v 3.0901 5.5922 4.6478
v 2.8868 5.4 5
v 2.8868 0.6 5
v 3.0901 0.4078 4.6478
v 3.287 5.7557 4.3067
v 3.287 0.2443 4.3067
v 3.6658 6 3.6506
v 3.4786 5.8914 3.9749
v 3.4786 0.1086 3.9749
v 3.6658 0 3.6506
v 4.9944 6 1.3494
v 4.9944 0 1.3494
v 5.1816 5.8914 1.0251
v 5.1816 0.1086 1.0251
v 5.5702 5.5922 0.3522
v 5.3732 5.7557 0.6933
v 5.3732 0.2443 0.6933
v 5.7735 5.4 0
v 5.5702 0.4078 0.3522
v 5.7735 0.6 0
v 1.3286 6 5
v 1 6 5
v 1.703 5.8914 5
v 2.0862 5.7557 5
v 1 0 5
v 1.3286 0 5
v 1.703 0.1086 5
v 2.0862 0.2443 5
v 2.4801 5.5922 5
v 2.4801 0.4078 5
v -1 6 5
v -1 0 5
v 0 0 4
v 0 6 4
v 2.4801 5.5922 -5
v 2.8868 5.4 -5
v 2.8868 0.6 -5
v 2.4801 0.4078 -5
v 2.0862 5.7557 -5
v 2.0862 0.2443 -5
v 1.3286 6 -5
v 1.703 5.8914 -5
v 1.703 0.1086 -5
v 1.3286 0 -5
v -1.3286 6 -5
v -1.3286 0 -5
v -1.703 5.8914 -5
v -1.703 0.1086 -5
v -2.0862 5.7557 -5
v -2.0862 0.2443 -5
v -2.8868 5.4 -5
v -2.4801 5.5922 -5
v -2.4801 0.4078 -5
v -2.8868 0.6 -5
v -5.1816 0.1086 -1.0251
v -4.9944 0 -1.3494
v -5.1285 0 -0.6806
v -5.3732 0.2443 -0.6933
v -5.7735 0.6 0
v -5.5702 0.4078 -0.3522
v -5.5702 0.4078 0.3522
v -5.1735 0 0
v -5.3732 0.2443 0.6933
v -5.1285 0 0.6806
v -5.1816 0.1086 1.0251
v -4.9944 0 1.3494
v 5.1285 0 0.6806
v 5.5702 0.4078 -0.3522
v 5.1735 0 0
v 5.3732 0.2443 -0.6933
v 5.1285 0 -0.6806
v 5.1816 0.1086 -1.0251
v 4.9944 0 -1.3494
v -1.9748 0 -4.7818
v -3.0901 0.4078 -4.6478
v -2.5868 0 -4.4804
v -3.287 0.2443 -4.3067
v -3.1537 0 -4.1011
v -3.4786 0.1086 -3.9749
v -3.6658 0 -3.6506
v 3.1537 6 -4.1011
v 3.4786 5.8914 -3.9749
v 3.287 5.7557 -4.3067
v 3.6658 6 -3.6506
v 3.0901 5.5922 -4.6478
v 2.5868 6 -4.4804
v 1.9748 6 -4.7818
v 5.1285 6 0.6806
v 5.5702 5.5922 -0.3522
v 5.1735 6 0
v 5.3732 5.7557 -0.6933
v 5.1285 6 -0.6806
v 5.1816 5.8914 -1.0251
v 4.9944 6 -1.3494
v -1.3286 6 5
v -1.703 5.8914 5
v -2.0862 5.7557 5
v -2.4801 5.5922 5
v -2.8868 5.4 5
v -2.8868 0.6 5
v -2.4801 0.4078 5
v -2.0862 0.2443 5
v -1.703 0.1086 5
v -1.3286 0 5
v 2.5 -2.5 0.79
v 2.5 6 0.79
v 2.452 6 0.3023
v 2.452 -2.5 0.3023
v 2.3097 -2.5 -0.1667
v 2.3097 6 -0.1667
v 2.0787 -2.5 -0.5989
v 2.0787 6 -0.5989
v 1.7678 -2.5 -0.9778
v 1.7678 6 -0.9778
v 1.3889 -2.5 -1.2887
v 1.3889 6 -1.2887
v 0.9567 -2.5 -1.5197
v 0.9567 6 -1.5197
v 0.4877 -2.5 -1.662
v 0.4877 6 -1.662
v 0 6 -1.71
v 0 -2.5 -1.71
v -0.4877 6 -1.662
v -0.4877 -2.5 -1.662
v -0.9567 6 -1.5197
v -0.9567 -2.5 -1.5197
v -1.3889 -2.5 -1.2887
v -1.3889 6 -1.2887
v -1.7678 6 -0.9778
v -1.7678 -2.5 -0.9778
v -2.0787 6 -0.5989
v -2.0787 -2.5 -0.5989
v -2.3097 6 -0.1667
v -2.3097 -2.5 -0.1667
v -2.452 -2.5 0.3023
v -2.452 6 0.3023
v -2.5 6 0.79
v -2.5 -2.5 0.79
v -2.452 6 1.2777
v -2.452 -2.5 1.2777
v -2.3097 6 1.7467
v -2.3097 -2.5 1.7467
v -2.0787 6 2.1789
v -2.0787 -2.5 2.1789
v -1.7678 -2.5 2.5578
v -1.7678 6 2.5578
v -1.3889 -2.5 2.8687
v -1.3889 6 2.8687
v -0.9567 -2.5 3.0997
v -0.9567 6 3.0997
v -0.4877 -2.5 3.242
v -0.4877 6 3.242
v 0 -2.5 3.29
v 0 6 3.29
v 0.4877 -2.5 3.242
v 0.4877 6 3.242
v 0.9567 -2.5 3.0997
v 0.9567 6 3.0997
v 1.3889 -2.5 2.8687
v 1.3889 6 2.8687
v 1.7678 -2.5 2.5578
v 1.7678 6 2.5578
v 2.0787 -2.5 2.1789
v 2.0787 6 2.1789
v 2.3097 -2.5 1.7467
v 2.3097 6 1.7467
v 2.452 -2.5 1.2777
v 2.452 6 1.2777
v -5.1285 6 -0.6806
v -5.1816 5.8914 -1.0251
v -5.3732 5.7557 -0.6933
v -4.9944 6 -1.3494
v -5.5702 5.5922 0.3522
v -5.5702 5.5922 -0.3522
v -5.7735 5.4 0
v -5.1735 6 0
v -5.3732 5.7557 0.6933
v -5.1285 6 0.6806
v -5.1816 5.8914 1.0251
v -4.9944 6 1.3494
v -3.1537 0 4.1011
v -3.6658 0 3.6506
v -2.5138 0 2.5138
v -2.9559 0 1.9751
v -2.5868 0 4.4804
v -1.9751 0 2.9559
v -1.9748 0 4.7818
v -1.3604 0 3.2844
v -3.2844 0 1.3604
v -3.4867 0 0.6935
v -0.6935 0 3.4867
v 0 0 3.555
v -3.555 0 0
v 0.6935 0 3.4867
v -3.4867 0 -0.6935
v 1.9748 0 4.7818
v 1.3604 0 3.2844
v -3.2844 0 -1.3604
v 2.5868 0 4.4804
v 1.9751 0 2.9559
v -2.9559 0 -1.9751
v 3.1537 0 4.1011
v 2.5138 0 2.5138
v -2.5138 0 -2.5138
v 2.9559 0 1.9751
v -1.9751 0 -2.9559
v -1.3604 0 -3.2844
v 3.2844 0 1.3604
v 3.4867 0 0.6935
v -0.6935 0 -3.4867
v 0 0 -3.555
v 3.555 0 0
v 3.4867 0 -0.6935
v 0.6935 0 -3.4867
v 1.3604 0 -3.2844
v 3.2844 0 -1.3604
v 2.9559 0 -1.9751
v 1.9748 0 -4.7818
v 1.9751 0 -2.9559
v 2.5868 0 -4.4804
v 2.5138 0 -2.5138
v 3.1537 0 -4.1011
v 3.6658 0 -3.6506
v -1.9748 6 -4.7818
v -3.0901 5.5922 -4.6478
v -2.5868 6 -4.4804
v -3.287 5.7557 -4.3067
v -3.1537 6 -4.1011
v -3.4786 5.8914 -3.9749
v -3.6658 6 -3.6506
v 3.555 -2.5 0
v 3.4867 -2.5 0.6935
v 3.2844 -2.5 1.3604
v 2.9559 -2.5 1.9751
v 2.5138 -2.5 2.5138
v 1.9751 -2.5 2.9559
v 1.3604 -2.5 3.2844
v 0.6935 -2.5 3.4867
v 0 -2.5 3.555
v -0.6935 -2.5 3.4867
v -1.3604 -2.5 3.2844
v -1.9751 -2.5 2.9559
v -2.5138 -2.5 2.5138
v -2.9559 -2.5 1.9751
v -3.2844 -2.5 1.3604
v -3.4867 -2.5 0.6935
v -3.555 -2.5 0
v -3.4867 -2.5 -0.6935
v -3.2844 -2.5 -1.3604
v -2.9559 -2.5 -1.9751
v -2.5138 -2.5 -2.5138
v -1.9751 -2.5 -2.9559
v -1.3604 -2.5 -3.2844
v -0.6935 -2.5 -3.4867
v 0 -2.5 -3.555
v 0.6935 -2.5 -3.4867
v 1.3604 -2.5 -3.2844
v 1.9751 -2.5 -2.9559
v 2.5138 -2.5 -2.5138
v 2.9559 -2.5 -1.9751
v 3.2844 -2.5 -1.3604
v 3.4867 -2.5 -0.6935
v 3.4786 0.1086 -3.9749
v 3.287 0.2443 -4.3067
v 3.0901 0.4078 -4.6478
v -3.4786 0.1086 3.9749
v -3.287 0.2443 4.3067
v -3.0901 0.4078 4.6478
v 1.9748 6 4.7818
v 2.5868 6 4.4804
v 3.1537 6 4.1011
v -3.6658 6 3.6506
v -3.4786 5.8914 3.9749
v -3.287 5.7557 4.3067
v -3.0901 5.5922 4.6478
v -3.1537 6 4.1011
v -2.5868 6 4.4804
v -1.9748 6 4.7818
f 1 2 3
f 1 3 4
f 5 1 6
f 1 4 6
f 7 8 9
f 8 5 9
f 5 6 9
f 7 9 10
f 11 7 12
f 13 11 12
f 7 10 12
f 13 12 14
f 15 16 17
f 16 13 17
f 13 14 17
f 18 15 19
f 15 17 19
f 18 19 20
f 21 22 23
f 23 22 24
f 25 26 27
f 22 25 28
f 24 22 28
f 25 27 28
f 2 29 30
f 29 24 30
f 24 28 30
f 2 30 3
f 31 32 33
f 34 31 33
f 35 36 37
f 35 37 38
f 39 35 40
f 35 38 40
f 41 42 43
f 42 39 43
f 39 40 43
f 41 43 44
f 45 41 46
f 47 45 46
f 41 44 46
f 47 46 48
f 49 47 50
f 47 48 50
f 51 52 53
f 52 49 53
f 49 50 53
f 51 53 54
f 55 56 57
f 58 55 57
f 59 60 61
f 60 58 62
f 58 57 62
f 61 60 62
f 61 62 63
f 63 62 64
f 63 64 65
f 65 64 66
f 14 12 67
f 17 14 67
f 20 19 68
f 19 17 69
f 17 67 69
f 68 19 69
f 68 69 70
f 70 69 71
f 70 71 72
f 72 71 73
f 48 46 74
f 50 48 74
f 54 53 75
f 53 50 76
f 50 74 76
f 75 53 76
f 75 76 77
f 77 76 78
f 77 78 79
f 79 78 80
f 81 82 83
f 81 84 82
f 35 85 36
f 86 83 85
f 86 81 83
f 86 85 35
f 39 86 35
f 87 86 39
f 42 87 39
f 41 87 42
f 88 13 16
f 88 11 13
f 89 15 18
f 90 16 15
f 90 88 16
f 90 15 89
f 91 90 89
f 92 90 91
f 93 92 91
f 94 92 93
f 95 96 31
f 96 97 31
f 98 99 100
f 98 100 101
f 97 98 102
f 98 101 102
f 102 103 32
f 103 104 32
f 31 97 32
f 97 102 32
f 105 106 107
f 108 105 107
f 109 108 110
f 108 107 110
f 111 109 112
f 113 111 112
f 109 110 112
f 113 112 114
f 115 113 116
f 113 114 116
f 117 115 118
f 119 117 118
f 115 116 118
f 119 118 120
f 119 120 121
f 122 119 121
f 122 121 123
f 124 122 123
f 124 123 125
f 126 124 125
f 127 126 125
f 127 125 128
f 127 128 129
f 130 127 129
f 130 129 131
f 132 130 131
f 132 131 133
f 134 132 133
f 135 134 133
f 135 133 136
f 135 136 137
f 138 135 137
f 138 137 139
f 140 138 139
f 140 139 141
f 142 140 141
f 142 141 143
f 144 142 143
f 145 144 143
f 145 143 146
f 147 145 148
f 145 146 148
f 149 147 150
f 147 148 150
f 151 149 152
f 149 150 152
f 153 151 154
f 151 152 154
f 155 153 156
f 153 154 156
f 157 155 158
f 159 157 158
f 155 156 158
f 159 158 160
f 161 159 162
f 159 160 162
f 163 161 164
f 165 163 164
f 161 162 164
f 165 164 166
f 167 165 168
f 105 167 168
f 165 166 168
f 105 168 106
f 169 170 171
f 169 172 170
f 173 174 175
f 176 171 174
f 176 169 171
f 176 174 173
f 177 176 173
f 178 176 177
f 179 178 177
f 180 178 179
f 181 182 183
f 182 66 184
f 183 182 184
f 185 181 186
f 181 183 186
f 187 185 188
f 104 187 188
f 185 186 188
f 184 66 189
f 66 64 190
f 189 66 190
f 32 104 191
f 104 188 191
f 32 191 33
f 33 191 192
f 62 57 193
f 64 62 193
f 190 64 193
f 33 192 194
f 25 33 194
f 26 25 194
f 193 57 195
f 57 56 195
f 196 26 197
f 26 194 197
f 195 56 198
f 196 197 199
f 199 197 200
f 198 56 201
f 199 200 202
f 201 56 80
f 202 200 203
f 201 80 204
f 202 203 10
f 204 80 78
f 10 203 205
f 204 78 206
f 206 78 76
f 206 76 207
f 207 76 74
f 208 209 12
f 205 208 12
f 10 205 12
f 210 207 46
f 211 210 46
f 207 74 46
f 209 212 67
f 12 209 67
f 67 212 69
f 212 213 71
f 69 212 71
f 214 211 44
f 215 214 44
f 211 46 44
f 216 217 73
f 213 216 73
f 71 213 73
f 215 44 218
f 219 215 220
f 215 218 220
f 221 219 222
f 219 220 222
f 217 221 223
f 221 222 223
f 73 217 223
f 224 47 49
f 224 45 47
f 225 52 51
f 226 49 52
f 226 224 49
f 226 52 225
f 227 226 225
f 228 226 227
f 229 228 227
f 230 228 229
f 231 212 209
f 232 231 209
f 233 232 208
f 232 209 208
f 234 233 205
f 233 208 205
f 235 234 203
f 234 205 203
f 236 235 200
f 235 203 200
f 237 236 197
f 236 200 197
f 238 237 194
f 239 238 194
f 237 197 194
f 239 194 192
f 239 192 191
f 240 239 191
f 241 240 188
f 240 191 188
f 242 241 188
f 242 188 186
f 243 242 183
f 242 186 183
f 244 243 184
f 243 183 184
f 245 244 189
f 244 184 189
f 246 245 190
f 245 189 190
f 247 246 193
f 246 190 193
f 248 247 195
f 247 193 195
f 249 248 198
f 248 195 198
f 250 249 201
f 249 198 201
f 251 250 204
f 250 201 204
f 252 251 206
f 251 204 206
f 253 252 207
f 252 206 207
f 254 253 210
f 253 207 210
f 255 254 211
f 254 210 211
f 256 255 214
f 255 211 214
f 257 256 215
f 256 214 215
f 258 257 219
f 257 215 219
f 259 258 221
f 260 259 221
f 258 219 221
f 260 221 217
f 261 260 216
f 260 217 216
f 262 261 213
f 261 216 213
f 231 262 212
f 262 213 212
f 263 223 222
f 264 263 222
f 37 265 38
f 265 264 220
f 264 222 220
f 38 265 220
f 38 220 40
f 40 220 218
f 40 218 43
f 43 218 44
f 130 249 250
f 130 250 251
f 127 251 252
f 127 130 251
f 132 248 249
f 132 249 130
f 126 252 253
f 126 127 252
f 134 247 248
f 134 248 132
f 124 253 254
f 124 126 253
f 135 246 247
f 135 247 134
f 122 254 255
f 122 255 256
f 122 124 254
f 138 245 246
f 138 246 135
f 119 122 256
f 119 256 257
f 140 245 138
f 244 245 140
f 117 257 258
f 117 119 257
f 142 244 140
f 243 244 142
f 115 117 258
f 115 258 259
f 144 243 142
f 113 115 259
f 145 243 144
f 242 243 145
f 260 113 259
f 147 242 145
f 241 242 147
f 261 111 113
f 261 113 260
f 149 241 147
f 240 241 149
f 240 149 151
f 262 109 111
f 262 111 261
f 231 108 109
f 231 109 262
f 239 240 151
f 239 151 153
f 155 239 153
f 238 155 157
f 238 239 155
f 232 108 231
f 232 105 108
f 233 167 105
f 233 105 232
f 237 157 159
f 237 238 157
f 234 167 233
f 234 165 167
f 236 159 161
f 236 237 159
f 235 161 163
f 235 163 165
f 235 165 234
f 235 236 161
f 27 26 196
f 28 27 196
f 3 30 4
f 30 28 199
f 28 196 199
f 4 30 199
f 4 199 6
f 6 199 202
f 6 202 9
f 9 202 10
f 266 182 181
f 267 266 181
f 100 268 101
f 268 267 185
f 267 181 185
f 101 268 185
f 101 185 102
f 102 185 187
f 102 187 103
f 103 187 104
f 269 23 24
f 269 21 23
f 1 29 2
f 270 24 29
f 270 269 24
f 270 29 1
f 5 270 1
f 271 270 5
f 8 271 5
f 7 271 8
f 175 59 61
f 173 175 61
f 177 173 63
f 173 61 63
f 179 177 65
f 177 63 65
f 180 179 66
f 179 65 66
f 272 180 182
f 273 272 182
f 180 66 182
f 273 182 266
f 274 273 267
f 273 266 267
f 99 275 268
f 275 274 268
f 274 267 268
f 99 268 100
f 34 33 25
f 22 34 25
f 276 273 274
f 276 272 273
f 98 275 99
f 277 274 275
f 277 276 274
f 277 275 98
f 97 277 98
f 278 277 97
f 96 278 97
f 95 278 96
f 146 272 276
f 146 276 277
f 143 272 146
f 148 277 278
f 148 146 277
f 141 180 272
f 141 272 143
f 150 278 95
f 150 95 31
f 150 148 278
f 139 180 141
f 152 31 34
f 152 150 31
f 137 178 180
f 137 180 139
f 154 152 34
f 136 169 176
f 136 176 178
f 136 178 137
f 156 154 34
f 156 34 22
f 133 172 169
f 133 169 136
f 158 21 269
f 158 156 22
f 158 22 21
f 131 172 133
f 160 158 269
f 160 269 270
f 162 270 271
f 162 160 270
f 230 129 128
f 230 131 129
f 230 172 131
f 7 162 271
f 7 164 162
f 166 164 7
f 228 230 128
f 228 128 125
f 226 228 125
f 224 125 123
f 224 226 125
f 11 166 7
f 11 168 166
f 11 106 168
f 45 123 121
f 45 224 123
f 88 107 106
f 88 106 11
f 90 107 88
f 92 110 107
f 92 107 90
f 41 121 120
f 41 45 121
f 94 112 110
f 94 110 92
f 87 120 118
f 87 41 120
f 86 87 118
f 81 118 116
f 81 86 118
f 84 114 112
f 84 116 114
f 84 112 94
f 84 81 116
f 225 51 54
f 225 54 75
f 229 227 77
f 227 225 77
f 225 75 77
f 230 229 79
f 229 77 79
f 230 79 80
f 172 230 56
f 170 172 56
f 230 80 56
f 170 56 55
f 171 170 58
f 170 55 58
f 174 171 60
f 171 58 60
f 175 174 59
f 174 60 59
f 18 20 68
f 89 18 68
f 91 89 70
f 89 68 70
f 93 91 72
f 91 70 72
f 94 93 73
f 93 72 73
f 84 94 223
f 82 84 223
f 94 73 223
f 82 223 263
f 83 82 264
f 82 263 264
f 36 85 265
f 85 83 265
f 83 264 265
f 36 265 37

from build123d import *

# Parameters (mm, degrees)
BOSS_EXTRUDE1_DEPTH = 6
SKETCH3_R           = 3.555
BOSS_EXTRUDE3_DEPTH = 2.5
SKETCH4_R           = 2.5
CUT_EXTRUDE1_DEPTH  = 9.5
CUT_EXTRUDE2_DEPTH  = 7


with BuildPart() as part:
    # Sketch1 → Boss-Extrude1 (new body)
    with BuildSketch(Plane(origin=(0, 0, 0), x_dir=(1, 0, 0), z_dir=(0, 1, 0))):
        Polygon((5.773502692, 0), (2.886751346, 5), (-2.886751346, 5), (-5.773502692, 0), (-2.886751346, -5), (2.886751346, -5), align=None)
    extrude(amount=BOSS_EXTRUDE1_DEPTH)

    # Sketch3 → Boss-Extrude3 (add)
    with BuildSketch(Plane.XZ):
        Circle(SKETCH3_R)
    extrude(amount=BOSS_EXTRUDE3_DEPTH)

    # Sketch4 → Cut-Extrude1 (cut, through all)
    with BuildSketch(Plane(origin=(0, 6, 0), x_dir=(1, 0, 0), z_dir=(0, 1, 0))):
        with Locations((0, -0.79)):
            Circle(SKETCH4_R)
    extrude(amount=-CUT_EXTRUDE1_DEPTH, mode=Mode.SUBTRACT)

    # Sketch5 → Cut-Extrude2 (cut, through all)
    with BuildSketch(Plane(origin=(0, 0, 0), x_dir=(-1, 0, 0), z_dir=(0, -1, 0))):
        Polygon((-1, -5), (1, -5), (0, -4), align=None)
    extrude(amount=-CUT_EXTRUDE2_DEPTH, mode=Mode.SUBTRACT)

    # Sketch6 → Cut-Revolve1 (revolve, cut)
    with BuildSketch(Plane.XY):
        Polygon((5.173502692, 6), (5.773502692, 6), (5.773502692, 5.4), align=None)
        Polygon((5.773502692, 0.6), (5.173502692, 0), (5.773502692, 0), align=None)
    revolve(axis=Axis((0, 0, 0), (0, 1, 0)), mode=Mode.SUBTRACT)


solid = part.part
